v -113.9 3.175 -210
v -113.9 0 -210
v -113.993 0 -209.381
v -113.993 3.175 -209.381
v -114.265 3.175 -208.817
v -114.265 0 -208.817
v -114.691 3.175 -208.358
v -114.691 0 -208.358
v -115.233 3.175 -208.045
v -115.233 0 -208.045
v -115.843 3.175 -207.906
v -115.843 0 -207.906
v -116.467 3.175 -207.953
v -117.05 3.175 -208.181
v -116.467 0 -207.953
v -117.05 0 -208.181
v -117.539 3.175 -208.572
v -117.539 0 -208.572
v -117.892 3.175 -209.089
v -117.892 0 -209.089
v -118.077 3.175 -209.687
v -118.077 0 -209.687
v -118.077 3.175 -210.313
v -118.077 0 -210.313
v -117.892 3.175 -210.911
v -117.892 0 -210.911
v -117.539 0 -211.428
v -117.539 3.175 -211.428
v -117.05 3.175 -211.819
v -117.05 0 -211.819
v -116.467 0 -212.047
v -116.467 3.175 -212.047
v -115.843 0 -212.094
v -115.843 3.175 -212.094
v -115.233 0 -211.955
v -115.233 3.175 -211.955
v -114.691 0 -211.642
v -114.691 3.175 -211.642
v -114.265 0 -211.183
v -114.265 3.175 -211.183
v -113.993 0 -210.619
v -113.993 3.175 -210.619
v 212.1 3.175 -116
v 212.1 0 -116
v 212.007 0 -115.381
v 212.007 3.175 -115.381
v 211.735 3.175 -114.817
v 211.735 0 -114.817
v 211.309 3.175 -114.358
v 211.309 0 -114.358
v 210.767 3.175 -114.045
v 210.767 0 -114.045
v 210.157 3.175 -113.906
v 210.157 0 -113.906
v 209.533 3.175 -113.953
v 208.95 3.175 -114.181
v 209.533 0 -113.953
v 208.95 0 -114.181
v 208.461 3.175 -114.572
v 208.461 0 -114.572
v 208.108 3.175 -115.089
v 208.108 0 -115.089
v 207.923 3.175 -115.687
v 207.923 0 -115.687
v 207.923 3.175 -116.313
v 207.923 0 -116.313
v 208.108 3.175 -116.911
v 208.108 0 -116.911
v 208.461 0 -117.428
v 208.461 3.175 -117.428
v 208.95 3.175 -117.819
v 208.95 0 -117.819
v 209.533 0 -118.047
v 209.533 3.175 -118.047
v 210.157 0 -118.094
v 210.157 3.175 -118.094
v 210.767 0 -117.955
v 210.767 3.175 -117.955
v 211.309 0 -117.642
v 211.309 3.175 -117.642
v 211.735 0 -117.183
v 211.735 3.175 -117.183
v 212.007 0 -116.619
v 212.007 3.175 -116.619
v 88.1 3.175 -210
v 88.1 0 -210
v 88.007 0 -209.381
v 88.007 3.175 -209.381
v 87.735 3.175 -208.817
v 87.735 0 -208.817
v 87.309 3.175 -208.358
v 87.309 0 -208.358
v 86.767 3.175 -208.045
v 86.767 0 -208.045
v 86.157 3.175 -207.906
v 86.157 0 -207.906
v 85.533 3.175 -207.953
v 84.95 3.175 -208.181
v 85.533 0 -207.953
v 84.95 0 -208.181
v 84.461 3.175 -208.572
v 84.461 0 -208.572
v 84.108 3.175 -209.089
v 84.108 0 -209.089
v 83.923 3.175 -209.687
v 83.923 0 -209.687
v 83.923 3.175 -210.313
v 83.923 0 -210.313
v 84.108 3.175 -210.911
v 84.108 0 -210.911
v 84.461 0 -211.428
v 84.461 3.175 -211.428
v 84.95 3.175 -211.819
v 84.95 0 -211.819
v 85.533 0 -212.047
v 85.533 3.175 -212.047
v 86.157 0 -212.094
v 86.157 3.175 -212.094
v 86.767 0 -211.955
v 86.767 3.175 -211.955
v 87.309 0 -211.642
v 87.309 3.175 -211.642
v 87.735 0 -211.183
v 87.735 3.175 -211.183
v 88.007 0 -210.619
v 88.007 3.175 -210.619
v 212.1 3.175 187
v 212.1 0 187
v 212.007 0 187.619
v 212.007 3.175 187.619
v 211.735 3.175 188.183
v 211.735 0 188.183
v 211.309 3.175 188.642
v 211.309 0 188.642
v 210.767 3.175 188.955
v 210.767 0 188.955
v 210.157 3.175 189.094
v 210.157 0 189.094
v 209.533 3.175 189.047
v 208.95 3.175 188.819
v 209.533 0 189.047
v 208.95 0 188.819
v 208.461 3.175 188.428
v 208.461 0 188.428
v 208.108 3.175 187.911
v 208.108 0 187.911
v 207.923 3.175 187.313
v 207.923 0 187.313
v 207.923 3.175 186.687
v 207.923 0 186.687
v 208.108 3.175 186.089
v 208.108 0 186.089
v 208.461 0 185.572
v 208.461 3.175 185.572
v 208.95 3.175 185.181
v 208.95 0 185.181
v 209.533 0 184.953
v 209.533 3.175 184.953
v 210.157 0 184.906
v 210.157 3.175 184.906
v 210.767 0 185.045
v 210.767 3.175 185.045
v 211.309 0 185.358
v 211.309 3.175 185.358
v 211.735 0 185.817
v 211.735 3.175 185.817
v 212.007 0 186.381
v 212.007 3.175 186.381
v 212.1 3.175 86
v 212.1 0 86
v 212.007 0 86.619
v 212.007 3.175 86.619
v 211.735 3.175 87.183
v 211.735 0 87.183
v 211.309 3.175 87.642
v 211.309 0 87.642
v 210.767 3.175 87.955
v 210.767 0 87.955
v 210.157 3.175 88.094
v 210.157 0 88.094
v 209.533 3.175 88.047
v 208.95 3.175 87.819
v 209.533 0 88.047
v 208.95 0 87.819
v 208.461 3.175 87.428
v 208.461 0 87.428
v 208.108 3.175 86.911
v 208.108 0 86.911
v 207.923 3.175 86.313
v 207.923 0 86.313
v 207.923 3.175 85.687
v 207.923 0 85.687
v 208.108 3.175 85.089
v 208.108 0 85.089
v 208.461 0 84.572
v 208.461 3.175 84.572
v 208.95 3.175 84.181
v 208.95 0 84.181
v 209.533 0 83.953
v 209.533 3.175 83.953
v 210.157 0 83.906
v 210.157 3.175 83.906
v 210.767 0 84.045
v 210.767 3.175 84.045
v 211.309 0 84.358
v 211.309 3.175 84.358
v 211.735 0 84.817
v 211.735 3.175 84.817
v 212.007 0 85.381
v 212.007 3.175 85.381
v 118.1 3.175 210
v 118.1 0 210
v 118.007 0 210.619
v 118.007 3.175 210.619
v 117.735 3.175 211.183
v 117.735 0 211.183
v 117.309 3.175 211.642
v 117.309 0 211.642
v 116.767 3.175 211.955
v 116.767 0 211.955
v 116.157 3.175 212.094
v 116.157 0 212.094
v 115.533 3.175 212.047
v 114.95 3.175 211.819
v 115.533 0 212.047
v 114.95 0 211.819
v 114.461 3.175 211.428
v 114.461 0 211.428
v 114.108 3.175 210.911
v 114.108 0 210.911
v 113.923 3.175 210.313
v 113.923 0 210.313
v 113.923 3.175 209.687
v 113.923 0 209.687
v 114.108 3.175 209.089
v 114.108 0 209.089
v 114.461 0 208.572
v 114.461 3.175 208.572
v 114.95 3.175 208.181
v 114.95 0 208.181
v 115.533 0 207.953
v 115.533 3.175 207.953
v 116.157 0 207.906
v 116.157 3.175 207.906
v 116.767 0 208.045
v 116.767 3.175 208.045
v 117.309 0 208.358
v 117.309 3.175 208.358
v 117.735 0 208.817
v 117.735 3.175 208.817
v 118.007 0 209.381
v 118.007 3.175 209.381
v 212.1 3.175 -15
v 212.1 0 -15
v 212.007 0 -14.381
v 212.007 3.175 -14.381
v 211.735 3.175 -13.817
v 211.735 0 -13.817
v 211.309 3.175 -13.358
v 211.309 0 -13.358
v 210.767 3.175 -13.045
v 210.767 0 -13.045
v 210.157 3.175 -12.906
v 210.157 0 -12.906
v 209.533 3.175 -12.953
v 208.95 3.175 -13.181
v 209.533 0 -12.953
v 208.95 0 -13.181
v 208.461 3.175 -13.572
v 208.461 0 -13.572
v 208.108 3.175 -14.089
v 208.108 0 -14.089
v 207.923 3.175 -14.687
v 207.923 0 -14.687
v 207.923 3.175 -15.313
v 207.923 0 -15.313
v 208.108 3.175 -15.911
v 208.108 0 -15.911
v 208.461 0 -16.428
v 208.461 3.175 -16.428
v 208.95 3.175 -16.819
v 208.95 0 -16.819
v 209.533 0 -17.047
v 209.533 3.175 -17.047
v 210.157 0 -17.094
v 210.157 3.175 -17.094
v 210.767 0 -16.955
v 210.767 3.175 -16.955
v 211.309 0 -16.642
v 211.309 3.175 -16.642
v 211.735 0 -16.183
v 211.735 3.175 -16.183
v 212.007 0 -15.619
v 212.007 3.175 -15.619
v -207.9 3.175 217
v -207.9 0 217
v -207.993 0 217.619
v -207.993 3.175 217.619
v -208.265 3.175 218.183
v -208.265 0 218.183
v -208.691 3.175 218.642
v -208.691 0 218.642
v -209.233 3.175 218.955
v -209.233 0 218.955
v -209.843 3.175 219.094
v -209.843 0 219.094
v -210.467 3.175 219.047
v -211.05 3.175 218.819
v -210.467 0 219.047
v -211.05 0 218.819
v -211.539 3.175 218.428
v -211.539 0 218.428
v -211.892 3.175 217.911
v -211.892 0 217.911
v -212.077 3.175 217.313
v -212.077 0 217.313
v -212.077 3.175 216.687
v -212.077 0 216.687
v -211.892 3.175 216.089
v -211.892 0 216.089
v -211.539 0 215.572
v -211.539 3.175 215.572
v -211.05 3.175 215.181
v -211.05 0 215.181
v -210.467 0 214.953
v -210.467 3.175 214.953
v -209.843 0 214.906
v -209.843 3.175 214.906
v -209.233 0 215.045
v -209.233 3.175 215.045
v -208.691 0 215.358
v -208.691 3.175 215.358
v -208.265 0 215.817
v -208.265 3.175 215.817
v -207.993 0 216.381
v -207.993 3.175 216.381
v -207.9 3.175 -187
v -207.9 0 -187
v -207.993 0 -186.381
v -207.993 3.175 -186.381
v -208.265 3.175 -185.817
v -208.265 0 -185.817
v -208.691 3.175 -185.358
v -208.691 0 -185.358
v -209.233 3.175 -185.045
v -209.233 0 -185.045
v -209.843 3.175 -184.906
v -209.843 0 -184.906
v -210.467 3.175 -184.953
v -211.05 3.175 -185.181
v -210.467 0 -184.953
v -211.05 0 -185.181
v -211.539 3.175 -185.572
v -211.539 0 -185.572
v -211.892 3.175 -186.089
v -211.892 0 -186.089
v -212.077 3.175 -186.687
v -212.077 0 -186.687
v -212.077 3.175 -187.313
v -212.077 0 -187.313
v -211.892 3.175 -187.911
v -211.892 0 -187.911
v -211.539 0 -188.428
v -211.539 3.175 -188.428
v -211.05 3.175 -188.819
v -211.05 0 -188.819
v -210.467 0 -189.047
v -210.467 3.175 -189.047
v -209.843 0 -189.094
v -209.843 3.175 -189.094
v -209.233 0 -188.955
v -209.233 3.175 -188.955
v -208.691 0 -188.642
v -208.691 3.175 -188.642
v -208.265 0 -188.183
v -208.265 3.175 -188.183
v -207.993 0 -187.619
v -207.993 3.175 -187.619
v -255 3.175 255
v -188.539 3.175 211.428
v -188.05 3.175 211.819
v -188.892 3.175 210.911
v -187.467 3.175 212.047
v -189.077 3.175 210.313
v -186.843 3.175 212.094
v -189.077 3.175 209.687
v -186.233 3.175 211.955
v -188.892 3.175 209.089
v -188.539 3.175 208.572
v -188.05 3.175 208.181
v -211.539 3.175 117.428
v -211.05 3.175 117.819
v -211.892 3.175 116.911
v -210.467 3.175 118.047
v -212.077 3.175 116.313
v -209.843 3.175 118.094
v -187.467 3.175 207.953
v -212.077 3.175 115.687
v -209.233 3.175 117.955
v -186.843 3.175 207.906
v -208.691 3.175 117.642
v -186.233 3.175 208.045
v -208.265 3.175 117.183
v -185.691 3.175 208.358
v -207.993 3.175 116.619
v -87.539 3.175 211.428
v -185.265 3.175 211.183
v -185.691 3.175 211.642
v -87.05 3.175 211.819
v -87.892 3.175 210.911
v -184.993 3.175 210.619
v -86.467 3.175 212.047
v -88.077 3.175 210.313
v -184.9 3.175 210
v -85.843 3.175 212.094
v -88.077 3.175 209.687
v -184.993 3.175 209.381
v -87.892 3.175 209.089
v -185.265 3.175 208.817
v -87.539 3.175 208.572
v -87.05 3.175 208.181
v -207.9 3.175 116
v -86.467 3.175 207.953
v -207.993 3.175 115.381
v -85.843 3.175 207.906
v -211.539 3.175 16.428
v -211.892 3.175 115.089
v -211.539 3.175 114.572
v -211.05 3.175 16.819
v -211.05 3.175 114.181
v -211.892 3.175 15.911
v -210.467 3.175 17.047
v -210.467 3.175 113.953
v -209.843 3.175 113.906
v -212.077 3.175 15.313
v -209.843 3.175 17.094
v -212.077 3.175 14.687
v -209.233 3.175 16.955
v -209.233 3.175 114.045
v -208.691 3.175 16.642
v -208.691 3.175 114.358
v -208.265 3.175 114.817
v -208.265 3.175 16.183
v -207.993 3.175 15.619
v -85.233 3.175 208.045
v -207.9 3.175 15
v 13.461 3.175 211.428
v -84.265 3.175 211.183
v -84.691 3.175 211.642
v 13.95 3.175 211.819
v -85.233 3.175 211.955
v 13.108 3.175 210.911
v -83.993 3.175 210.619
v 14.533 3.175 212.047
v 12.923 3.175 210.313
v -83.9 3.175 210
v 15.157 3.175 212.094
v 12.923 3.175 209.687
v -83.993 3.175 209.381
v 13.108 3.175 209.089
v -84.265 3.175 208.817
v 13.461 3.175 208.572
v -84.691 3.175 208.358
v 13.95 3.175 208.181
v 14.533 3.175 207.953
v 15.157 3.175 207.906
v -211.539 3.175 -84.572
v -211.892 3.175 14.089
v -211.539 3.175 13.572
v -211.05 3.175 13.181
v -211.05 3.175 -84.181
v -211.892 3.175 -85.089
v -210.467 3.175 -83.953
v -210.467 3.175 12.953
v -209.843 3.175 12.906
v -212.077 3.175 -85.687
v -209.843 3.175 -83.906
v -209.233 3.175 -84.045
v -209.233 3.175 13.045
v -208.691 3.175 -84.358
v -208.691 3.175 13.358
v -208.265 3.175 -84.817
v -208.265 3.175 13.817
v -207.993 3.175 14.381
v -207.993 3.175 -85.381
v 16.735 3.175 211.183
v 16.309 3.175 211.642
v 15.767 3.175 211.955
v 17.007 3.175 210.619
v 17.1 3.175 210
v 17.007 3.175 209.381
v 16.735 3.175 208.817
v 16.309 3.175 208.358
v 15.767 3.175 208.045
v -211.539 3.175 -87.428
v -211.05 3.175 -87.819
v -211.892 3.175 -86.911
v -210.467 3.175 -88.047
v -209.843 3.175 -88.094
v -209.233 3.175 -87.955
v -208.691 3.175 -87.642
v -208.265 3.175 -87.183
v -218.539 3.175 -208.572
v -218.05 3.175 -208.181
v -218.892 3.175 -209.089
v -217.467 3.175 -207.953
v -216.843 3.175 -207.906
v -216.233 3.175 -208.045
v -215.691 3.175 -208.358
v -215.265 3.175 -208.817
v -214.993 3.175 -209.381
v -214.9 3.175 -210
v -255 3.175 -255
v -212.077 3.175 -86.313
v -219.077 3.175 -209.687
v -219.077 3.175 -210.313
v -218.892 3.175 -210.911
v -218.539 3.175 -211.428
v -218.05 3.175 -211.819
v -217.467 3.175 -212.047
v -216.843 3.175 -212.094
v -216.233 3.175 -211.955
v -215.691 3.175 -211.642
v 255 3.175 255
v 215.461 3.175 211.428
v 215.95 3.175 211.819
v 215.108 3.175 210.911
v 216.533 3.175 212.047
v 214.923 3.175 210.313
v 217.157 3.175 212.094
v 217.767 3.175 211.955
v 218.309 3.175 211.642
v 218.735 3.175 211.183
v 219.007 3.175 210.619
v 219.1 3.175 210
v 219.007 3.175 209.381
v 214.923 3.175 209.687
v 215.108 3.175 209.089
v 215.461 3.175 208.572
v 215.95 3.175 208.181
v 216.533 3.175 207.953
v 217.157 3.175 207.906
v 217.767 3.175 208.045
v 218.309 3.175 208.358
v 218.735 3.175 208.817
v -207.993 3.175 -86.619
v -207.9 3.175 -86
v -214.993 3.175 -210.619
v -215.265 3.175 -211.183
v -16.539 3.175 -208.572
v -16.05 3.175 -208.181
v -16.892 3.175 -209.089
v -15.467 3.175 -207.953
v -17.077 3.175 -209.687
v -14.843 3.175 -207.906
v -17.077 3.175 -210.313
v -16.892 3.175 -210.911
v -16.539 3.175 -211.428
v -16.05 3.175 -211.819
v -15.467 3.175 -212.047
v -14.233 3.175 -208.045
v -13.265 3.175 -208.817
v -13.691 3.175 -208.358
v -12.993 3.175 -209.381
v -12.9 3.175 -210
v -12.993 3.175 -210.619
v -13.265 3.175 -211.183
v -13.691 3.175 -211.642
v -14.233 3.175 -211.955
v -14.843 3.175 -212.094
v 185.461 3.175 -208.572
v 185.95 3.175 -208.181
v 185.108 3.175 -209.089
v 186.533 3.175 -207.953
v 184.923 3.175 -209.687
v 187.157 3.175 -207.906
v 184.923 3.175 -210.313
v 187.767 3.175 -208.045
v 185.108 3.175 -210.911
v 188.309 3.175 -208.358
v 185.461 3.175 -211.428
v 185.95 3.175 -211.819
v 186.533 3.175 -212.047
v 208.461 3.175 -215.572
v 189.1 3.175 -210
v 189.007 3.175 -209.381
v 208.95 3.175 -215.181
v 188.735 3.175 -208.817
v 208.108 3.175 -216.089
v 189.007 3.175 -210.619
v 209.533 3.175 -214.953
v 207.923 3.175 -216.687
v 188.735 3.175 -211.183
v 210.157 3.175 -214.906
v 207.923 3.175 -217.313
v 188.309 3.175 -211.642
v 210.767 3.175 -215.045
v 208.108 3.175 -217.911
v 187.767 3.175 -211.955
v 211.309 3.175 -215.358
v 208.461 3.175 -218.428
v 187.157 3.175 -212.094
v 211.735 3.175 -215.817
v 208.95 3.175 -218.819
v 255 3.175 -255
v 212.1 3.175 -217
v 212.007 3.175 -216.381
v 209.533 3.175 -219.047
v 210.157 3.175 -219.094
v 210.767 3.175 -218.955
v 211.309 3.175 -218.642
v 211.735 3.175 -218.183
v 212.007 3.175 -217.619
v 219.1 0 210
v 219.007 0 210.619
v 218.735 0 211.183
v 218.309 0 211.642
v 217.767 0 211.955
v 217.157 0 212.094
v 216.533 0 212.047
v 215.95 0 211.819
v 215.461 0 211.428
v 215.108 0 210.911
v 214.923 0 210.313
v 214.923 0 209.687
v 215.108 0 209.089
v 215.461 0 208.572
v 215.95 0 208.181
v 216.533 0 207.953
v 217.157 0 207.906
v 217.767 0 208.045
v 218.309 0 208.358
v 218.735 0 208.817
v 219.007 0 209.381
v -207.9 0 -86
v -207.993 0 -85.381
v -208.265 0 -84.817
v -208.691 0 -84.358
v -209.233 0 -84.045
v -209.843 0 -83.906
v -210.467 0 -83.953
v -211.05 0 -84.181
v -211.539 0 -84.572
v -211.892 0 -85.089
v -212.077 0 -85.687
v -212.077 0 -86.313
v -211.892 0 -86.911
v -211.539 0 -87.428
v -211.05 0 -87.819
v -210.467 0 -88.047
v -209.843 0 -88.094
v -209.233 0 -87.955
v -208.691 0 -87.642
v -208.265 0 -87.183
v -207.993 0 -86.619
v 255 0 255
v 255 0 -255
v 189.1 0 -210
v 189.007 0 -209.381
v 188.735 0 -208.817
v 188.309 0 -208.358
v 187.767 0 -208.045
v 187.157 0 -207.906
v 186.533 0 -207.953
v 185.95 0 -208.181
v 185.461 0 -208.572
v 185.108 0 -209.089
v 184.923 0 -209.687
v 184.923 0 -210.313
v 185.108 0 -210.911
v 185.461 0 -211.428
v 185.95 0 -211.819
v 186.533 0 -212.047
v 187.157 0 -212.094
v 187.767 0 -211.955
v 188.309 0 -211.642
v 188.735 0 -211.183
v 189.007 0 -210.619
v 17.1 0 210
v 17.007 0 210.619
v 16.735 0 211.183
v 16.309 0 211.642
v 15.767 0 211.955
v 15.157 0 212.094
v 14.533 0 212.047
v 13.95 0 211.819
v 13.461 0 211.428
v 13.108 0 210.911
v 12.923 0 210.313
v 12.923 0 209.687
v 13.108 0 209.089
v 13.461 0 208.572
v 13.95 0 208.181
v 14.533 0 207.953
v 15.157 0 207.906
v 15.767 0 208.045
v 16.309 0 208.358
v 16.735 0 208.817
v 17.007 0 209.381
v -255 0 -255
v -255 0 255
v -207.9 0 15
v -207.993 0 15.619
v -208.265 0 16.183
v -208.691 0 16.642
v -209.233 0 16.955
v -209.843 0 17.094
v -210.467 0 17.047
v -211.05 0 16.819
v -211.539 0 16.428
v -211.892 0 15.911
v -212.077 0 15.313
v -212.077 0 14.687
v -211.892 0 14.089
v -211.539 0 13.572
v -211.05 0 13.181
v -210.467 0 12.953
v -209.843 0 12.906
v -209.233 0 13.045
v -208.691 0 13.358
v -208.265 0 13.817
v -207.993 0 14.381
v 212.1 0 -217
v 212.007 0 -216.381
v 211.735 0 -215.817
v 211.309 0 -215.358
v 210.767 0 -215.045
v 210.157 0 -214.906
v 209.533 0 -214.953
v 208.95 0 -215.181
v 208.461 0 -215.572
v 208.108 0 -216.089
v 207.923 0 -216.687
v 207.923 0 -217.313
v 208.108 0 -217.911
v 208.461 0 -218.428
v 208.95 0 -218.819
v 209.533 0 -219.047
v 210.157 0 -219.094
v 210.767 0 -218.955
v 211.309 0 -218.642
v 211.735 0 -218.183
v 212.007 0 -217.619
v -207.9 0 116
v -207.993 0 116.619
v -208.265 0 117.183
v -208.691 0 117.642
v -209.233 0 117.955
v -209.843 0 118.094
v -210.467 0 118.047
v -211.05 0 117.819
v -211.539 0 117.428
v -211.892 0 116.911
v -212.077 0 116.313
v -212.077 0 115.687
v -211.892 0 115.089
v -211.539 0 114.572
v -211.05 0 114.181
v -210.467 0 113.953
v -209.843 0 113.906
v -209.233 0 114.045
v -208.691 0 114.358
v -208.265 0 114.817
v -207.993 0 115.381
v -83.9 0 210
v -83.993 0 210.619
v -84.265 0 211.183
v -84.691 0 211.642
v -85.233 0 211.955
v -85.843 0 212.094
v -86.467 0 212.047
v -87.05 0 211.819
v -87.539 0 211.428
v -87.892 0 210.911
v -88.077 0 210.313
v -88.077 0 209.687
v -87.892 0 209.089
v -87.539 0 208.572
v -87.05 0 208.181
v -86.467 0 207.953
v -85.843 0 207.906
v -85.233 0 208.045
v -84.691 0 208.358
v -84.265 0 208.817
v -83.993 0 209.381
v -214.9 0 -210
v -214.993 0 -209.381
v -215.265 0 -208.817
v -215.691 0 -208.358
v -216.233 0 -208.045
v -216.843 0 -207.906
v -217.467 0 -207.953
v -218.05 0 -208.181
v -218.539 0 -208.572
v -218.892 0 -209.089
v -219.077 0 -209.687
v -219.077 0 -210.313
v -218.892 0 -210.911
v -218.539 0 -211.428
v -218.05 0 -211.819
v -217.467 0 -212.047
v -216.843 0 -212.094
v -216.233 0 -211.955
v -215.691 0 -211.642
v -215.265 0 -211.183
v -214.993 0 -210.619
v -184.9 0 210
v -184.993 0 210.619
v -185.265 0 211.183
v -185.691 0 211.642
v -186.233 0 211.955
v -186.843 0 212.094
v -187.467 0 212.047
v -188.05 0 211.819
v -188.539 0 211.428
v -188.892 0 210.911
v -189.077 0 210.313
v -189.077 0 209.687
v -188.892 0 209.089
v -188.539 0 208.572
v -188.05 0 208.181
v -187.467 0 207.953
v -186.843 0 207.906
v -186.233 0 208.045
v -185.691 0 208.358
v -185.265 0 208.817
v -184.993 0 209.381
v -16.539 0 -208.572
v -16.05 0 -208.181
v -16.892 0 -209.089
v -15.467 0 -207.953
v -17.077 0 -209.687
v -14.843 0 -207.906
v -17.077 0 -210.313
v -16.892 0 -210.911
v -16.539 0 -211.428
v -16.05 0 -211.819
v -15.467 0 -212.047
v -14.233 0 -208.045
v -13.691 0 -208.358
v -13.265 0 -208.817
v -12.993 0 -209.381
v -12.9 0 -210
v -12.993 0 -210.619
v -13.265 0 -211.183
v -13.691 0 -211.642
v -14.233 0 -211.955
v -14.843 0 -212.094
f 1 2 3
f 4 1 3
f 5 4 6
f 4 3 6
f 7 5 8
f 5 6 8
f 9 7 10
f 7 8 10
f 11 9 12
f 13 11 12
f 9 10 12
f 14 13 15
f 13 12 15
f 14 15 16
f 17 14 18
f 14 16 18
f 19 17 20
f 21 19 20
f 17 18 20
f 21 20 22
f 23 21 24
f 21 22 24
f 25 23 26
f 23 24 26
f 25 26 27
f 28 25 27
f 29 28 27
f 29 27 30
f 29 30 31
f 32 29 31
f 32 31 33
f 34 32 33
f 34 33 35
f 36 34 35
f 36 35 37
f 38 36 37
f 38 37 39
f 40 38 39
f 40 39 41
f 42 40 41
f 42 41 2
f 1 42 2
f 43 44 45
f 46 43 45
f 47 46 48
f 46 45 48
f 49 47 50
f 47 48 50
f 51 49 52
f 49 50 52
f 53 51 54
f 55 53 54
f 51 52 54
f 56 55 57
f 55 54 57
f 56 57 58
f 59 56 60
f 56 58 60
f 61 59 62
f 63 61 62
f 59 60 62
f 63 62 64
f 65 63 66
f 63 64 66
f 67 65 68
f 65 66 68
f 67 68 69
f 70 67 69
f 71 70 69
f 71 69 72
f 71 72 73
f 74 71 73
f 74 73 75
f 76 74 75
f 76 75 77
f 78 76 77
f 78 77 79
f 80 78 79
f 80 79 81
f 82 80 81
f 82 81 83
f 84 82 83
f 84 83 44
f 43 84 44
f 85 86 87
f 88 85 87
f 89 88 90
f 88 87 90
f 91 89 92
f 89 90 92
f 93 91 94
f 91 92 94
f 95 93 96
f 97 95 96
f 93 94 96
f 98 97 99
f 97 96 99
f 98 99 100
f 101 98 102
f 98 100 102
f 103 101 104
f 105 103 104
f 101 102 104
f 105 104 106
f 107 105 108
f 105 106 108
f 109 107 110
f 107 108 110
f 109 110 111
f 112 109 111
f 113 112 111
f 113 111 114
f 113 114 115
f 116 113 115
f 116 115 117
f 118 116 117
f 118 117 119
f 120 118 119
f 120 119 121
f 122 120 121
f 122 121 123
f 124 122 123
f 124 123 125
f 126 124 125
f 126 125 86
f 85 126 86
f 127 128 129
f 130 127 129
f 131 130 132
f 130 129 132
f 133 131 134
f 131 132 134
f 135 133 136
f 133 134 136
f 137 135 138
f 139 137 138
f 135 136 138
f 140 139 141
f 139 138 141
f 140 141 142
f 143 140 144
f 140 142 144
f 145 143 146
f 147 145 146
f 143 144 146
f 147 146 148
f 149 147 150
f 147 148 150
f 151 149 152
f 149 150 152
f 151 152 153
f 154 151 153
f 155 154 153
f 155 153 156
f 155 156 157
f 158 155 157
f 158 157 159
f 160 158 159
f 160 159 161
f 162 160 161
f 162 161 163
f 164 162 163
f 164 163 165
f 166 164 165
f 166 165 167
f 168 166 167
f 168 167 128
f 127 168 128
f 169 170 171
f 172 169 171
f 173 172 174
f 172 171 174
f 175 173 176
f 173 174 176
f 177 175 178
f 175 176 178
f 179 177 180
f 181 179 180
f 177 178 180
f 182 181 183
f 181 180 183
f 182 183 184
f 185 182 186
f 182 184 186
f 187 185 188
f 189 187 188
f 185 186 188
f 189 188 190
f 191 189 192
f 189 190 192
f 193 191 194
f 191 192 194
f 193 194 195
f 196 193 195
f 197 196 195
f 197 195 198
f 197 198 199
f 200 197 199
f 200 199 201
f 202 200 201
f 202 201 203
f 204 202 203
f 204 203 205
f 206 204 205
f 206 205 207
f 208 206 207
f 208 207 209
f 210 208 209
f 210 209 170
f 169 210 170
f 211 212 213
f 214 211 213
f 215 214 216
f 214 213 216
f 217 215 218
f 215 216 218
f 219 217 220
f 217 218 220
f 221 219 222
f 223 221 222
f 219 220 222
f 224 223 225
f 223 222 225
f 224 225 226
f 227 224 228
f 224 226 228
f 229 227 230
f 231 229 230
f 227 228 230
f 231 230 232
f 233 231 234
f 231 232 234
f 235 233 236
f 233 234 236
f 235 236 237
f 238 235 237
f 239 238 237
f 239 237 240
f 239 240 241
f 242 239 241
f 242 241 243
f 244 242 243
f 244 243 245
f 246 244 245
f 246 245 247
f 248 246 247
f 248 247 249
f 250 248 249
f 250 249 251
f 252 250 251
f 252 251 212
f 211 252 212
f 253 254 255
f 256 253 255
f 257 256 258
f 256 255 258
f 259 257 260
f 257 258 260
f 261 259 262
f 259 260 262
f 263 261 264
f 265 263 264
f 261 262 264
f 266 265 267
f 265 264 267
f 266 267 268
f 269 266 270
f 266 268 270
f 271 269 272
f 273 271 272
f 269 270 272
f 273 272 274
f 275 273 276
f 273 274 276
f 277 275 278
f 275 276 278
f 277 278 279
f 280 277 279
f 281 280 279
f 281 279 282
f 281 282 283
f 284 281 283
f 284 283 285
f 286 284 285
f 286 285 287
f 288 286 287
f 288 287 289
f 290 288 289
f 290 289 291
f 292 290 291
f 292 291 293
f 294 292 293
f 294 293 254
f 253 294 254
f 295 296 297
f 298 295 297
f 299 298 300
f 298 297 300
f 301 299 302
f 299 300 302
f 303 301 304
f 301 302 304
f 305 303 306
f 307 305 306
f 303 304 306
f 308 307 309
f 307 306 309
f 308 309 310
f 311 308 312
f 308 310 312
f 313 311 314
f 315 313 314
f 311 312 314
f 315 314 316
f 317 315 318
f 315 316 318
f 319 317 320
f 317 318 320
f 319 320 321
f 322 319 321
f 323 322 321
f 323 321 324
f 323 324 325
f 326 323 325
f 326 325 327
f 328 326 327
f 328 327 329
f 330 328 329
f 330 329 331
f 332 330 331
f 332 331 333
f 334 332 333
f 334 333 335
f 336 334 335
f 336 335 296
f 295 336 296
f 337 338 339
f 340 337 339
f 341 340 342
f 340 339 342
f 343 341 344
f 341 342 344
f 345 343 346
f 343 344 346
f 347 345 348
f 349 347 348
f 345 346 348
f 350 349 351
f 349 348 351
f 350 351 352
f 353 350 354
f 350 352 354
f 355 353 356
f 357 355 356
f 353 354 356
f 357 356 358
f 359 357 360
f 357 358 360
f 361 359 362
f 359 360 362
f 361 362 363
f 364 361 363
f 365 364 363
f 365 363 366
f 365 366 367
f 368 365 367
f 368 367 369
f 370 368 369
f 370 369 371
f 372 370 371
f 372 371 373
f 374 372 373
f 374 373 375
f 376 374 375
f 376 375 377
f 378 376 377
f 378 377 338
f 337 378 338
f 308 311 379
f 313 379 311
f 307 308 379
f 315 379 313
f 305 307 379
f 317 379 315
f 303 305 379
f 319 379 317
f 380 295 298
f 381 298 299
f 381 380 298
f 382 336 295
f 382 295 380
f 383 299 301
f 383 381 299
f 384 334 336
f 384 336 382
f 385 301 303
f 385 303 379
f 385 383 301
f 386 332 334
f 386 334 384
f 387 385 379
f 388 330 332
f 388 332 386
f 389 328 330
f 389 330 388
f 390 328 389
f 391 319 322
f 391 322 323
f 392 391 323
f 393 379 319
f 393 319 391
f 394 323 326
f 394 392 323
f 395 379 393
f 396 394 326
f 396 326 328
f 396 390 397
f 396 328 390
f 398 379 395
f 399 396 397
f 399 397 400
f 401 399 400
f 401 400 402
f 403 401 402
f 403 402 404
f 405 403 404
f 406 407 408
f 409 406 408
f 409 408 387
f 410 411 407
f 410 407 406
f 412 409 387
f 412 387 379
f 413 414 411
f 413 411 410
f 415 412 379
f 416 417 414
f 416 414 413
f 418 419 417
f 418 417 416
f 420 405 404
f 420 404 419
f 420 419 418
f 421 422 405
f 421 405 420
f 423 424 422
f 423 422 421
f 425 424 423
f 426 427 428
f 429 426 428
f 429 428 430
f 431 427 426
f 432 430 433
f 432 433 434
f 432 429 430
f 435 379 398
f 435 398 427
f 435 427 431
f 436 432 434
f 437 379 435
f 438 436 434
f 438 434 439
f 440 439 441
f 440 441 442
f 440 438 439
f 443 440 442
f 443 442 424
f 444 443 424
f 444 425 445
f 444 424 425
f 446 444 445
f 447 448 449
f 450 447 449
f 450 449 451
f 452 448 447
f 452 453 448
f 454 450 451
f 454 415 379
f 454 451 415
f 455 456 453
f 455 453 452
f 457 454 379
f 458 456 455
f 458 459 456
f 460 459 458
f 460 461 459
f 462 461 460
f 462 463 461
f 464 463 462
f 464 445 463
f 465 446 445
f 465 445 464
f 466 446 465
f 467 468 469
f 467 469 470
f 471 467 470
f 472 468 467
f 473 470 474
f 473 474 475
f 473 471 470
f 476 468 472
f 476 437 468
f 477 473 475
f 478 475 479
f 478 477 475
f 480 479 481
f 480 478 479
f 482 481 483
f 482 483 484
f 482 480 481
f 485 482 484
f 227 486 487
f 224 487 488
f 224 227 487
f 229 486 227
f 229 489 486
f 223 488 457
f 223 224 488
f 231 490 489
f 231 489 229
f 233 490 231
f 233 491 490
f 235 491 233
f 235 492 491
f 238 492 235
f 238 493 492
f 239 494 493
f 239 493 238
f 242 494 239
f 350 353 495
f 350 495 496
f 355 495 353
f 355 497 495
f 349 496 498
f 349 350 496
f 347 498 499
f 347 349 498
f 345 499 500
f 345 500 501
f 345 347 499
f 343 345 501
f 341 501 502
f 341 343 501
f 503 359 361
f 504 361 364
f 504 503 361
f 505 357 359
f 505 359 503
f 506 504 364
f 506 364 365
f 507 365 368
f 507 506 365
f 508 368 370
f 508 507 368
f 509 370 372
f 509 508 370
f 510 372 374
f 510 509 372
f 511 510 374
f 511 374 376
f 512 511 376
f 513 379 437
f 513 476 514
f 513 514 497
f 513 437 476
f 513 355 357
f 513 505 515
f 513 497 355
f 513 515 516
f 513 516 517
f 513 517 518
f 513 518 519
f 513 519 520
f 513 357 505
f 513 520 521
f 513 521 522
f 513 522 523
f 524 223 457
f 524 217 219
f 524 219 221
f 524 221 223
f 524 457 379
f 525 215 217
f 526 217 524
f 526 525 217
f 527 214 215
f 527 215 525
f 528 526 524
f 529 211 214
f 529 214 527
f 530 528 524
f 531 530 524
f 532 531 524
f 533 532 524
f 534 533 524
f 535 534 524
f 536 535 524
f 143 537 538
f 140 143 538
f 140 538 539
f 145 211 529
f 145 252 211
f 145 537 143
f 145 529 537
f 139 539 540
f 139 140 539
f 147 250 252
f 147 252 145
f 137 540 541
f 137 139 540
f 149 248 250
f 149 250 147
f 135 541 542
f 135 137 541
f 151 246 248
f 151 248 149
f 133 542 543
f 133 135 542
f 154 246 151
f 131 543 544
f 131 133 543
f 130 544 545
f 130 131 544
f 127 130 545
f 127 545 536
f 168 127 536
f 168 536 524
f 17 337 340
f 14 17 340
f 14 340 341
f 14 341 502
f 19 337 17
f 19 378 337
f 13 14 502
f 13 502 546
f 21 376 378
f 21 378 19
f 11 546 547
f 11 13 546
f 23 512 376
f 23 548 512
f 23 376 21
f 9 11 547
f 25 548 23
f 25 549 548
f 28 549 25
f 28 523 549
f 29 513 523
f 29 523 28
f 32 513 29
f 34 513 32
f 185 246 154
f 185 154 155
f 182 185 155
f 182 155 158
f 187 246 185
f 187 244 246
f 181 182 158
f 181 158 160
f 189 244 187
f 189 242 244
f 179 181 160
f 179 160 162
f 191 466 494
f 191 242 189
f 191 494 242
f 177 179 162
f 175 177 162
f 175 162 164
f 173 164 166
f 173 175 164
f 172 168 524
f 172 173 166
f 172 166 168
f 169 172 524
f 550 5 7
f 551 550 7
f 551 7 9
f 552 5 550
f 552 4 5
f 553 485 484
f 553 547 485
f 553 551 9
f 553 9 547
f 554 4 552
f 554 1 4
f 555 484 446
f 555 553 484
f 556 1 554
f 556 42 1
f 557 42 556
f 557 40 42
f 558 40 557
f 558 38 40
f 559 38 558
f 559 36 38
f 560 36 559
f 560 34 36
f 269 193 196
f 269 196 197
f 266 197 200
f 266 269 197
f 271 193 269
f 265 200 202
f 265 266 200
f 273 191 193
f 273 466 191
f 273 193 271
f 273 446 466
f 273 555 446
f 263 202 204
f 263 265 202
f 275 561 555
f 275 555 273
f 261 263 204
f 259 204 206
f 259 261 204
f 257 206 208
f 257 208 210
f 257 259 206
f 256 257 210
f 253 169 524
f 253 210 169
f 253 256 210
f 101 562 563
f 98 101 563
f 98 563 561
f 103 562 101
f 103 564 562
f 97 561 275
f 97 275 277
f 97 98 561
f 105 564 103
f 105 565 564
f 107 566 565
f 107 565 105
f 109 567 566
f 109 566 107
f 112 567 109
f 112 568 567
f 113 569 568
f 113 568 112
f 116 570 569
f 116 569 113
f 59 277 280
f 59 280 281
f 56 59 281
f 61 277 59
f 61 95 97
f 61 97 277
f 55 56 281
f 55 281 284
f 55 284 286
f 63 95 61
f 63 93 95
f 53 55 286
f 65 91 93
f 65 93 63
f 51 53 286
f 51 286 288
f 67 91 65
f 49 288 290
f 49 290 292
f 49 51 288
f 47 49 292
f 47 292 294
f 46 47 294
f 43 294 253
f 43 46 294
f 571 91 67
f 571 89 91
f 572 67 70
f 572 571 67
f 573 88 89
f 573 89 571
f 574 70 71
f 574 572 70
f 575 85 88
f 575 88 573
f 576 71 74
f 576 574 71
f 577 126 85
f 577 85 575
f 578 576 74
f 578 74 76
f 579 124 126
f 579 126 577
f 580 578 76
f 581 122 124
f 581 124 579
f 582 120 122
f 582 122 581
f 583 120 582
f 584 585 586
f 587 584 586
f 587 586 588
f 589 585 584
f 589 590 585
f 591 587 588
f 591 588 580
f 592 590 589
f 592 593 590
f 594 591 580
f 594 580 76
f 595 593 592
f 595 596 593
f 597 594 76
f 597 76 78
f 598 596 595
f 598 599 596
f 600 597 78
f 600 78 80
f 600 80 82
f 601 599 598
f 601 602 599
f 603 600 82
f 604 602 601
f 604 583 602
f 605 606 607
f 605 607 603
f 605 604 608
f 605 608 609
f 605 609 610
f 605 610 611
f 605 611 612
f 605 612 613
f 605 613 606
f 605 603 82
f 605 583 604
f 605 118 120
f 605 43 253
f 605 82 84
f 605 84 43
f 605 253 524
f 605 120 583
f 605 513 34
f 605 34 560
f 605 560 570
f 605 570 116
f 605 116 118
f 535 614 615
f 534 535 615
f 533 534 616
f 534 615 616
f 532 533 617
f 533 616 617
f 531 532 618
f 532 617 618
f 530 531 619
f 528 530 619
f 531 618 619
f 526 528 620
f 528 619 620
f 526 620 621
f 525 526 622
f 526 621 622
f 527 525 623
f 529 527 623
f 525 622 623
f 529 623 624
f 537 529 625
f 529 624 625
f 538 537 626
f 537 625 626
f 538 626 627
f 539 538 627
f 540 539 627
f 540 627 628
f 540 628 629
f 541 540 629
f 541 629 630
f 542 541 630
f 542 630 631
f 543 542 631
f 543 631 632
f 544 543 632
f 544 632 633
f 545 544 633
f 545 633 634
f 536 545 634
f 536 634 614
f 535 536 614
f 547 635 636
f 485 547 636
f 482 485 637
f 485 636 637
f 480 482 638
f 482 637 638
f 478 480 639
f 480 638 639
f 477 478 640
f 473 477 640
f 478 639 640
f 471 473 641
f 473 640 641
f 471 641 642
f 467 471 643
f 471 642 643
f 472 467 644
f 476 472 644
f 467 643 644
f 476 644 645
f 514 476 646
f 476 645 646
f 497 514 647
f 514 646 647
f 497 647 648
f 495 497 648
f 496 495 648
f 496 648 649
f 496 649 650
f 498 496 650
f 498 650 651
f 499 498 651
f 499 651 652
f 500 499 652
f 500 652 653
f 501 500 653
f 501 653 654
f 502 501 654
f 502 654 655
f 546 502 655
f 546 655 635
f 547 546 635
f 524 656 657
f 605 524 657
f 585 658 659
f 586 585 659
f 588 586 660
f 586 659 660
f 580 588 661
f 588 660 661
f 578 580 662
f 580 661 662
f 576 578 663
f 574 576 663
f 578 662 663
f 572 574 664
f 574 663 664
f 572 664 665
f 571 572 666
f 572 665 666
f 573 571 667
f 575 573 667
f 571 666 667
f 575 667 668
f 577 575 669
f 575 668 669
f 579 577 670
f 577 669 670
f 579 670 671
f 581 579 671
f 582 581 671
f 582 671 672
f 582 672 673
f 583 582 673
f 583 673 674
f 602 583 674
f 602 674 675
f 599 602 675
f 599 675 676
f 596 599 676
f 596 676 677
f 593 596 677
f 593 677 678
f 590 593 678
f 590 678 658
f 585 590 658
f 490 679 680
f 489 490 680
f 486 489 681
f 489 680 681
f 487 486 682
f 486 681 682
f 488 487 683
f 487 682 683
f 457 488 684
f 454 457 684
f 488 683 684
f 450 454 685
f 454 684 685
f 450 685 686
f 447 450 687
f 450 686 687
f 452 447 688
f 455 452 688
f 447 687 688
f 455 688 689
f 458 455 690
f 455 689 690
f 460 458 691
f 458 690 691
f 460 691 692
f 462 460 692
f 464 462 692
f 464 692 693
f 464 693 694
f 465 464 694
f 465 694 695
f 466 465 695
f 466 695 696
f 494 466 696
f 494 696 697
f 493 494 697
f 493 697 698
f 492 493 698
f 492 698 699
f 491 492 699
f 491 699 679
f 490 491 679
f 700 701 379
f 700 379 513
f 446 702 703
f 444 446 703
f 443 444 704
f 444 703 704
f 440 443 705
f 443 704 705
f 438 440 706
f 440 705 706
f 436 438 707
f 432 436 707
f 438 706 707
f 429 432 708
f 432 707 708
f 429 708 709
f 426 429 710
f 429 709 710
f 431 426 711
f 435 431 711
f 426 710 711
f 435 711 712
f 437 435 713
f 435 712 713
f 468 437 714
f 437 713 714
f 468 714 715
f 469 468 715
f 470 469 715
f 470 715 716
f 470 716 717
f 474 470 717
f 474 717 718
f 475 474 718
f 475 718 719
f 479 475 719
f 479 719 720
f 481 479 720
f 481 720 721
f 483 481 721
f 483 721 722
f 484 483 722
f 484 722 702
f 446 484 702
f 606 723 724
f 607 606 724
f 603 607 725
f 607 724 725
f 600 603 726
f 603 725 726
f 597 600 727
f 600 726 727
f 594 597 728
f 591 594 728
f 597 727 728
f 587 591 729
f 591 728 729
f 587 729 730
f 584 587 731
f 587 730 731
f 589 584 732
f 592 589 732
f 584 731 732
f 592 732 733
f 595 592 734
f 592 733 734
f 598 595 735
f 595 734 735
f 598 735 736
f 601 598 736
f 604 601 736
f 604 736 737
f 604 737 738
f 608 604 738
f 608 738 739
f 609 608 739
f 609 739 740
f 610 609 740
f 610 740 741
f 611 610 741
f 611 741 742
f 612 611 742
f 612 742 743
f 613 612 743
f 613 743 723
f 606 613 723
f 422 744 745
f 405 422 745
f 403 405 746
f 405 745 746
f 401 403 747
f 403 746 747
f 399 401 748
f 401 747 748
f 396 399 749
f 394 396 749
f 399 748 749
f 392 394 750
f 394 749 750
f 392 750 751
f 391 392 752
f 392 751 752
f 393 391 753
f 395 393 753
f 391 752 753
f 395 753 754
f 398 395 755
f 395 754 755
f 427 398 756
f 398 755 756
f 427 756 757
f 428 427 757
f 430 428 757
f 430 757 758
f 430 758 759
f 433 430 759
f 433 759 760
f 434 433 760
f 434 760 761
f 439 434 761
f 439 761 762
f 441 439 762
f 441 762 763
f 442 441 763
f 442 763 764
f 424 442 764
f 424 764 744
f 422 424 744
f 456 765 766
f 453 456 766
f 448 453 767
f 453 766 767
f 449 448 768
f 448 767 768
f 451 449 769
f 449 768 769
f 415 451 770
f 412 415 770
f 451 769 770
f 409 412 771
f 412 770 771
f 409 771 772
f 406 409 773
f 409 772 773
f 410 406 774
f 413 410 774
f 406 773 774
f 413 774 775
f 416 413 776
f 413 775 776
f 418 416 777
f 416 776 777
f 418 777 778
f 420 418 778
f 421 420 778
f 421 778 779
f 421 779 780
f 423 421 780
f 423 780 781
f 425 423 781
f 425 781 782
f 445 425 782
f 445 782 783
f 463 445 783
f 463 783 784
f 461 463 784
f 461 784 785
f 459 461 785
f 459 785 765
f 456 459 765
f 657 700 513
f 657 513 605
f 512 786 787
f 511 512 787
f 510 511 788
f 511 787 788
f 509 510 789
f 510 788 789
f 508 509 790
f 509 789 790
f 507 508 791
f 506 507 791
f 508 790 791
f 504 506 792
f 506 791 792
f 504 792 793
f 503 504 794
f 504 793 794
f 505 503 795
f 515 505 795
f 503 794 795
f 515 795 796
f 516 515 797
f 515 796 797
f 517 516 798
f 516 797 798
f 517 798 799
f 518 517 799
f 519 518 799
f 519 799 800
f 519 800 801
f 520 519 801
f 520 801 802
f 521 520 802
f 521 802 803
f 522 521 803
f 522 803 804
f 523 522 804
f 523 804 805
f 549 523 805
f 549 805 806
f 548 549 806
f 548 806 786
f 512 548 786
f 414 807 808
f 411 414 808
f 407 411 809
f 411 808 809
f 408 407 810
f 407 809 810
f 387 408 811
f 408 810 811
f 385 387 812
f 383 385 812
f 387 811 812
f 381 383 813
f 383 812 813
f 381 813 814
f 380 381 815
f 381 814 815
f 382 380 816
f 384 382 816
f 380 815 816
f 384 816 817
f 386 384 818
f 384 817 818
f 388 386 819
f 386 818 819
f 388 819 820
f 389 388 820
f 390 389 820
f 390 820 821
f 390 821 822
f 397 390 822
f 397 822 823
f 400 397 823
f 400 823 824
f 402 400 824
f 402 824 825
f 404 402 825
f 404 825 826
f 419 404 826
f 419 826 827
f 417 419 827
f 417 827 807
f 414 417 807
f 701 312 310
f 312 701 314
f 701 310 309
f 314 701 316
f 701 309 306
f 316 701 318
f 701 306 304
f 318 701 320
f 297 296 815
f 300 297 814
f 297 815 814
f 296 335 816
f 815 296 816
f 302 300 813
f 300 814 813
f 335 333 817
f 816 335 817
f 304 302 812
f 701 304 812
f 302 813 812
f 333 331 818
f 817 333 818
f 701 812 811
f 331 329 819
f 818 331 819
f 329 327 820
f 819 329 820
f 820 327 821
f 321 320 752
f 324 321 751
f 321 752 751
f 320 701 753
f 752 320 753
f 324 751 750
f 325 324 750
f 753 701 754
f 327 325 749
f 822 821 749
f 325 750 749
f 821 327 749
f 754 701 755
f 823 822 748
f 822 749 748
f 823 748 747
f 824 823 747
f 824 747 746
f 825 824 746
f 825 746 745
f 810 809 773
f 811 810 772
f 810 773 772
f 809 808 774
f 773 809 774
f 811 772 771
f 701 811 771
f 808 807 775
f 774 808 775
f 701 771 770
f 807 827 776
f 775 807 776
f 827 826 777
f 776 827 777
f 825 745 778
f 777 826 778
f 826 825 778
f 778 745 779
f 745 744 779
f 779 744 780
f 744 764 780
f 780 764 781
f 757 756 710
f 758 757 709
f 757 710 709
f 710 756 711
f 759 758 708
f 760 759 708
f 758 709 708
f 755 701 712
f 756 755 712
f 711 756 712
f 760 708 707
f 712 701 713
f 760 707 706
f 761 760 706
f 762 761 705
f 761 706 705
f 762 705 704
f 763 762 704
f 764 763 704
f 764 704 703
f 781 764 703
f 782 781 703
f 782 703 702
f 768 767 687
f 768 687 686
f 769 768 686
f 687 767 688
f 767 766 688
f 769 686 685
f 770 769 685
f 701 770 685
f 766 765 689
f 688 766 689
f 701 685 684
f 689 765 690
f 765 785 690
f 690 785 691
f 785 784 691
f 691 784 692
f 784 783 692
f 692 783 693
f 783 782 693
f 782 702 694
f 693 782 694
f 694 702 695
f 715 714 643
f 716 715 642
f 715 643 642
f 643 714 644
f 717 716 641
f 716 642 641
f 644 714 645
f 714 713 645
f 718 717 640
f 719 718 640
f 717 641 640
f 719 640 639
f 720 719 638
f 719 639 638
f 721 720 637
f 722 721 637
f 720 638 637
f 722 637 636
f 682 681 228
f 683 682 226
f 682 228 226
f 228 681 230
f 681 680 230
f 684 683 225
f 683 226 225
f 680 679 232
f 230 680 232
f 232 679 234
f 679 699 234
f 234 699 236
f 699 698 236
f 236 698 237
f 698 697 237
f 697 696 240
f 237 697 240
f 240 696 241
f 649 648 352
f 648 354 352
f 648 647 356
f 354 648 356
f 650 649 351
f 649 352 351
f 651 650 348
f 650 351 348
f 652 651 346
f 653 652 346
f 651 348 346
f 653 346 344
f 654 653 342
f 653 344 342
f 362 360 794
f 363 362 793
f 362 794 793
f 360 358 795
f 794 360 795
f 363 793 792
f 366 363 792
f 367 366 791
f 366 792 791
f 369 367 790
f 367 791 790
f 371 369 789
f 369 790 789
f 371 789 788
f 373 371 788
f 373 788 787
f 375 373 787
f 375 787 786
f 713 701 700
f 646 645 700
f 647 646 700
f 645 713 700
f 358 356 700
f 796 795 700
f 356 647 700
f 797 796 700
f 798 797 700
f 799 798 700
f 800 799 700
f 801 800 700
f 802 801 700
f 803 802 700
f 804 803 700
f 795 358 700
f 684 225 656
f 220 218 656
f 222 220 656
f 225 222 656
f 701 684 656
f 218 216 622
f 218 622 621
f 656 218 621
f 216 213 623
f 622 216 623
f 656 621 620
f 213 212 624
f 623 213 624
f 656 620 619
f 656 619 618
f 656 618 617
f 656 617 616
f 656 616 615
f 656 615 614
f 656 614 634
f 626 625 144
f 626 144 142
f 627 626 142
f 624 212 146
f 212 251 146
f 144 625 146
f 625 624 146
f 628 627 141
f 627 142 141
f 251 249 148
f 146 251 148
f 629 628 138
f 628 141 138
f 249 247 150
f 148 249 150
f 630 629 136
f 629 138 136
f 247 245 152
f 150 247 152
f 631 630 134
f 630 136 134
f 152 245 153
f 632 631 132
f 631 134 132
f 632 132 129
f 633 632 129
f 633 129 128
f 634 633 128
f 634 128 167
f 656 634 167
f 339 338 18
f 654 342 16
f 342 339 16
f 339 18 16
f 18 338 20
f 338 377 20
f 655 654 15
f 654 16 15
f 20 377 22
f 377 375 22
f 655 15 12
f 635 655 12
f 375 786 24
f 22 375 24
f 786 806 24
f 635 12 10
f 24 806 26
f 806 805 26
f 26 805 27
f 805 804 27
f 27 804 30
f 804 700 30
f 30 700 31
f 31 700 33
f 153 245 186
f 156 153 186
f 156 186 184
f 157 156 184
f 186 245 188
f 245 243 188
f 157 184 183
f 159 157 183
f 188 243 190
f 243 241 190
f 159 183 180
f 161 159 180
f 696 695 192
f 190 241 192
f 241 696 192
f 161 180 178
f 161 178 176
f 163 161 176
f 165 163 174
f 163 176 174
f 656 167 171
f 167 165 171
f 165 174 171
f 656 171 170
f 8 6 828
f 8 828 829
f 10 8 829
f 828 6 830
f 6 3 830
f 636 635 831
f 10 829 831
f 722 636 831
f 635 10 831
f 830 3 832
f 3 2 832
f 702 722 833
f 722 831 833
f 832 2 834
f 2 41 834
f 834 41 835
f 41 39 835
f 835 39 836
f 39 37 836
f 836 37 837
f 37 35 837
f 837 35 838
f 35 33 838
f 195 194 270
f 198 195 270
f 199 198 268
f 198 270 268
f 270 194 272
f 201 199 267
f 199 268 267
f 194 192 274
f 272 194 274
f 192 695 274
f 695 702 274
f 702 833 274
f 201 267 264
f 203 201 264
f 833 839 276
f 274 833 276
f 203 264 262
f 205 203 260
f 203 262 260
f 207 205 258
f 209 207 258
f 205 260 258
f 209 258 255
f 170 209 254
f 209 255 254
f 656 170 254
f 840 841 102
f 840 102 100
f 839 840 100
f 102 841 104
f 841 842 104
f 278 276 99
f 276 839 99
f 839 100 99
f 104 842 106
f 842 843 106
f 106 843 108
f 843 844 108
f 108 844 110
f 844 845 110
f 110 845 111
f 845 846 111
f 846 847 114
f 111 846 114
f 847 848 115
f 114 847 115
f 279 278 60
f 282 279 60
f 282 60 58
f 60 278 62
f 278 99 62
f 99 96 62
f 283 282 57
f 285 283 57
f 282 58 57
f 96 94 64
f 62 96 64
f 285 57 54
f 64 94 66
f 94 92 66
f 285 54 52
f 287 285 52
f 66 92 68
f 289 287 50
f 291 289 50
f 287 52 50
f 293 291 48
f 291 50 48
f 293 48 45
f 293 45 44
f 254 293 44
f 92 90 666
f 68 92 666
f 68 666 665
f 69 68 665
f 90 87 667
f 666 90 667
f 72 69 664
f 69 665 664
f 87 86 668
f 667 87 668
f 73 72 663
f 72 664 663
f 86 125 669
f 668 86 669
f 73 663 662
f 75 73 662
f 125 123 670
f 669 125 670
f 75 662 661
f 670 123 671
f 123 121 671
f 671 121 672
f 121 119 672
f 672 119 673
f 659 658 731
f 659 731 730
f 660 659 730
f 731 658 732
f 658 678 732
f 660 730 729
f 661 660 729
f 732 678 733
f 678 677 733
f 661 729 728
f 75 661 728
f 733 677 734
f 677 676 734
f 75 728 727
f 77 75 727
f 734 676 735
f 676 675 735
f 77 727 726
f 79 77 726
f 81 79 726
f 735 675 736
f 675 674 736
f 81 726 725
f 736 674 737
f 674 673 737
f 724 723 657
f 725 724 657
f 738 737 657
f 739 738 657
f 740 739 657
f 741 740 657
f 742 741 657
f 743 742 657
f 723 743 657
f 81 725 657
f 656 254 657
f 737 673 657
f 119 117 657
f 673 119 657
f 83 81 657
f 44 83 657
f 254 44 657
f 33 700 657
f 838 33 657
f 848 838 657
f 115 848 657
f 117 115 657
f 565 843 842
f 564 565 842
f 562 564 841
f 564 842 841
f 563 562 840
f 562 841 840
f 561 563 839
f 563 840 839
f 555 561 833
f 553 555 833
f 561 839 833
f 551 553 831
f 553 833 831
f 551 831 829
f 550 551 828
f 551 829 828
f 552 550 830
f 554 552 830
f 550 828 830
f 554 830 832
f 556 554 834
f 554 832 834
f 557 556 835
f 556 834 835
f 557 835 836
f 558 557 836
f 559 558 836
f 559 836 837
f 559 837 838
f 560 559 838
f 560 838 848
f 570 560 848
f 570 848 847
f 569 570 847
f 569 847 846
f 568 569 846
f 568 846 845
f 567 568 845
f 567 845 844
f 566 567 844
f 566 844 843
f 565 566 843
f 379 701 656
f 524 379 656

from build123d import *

# Parameters (mm, degrees)
SKETCH1_W           = 510
SKETCH1_H           = 510
BOSS_EXTRUDE1_DEPTH = 3.175
SKETCH3_R           = 2.1
CUT_EXTRUDE1_DEPTH  = 4.175


with BuildPart() as part:
    # Sketch1 → Boss-Extrude1 (new body)
    with BuildSketch(Plane(origin=(0, 0, 0), x_dir=(1, 0, 0), z_dir=(0, 1, 0))):
        Rectangle(SKETCH1_W, SKETCH1_H)
    extrude(amount=BOSS_EXTRUDE1_DEPTH)

    # Sketch3 → Cut-Extrude1 (cut, through all)
    with BuildSketch(Plane.XZ):
        with Locations((217, 210)):
            Circle(SKETCH3_R)
        with Locations((116, 210)):
            Circle(SKETCH3_R)
        with Locations((15, 210)):
            Circle(SKETCH3_R)
        with Locations((-86, 210)):
            Circle(SKETCH3_R)
        with Locations((-187, 210)):
            Circle(SKETCH3_R)
        with Locations((-210, 217)):
            Circle(SKETCH3_R)
        with Locations((-210, 116)):
            Circle(SKETCH3_R)
        with Locations((-210, 15)):
            Circle(SKETCH3_R)
        with Locations((-210, -86)):
            Circle(SKETCH3_R)
        with Locations((-210, -187)):
            Circle(SKETCH3_R)
        with Locations((-217, -210)):
            Circle(SKETCH3_R)
        with Locations((-116, -210)):
            Circle(SKETCH3_R)
        with Locations((-15, -210)):
            Circle(SKETCH3_R)
        with Locations((86, -210)):
            Circle(SKETCH3_R)
        with Locations((187, -210)):
            Circle(SKETCH3_R)
        with Locations((210, -217)):
            Circle(SKETCH3_R)
        with Locations((210, -116)):
            Circle(SKETCH3_R)
        with Locations((210, -15)):
            Circle(SKETCH3_R)
        with Locations((210, 86)):
            Circle(SKETCH3_R)
        with Locations((210, 187)):
            Circle(SKETCH3_R)
    extrude(amount=-CUT_EXTRUDE1_DEPTH, mode=Mode.SUBTRACT)


solid = part.part
